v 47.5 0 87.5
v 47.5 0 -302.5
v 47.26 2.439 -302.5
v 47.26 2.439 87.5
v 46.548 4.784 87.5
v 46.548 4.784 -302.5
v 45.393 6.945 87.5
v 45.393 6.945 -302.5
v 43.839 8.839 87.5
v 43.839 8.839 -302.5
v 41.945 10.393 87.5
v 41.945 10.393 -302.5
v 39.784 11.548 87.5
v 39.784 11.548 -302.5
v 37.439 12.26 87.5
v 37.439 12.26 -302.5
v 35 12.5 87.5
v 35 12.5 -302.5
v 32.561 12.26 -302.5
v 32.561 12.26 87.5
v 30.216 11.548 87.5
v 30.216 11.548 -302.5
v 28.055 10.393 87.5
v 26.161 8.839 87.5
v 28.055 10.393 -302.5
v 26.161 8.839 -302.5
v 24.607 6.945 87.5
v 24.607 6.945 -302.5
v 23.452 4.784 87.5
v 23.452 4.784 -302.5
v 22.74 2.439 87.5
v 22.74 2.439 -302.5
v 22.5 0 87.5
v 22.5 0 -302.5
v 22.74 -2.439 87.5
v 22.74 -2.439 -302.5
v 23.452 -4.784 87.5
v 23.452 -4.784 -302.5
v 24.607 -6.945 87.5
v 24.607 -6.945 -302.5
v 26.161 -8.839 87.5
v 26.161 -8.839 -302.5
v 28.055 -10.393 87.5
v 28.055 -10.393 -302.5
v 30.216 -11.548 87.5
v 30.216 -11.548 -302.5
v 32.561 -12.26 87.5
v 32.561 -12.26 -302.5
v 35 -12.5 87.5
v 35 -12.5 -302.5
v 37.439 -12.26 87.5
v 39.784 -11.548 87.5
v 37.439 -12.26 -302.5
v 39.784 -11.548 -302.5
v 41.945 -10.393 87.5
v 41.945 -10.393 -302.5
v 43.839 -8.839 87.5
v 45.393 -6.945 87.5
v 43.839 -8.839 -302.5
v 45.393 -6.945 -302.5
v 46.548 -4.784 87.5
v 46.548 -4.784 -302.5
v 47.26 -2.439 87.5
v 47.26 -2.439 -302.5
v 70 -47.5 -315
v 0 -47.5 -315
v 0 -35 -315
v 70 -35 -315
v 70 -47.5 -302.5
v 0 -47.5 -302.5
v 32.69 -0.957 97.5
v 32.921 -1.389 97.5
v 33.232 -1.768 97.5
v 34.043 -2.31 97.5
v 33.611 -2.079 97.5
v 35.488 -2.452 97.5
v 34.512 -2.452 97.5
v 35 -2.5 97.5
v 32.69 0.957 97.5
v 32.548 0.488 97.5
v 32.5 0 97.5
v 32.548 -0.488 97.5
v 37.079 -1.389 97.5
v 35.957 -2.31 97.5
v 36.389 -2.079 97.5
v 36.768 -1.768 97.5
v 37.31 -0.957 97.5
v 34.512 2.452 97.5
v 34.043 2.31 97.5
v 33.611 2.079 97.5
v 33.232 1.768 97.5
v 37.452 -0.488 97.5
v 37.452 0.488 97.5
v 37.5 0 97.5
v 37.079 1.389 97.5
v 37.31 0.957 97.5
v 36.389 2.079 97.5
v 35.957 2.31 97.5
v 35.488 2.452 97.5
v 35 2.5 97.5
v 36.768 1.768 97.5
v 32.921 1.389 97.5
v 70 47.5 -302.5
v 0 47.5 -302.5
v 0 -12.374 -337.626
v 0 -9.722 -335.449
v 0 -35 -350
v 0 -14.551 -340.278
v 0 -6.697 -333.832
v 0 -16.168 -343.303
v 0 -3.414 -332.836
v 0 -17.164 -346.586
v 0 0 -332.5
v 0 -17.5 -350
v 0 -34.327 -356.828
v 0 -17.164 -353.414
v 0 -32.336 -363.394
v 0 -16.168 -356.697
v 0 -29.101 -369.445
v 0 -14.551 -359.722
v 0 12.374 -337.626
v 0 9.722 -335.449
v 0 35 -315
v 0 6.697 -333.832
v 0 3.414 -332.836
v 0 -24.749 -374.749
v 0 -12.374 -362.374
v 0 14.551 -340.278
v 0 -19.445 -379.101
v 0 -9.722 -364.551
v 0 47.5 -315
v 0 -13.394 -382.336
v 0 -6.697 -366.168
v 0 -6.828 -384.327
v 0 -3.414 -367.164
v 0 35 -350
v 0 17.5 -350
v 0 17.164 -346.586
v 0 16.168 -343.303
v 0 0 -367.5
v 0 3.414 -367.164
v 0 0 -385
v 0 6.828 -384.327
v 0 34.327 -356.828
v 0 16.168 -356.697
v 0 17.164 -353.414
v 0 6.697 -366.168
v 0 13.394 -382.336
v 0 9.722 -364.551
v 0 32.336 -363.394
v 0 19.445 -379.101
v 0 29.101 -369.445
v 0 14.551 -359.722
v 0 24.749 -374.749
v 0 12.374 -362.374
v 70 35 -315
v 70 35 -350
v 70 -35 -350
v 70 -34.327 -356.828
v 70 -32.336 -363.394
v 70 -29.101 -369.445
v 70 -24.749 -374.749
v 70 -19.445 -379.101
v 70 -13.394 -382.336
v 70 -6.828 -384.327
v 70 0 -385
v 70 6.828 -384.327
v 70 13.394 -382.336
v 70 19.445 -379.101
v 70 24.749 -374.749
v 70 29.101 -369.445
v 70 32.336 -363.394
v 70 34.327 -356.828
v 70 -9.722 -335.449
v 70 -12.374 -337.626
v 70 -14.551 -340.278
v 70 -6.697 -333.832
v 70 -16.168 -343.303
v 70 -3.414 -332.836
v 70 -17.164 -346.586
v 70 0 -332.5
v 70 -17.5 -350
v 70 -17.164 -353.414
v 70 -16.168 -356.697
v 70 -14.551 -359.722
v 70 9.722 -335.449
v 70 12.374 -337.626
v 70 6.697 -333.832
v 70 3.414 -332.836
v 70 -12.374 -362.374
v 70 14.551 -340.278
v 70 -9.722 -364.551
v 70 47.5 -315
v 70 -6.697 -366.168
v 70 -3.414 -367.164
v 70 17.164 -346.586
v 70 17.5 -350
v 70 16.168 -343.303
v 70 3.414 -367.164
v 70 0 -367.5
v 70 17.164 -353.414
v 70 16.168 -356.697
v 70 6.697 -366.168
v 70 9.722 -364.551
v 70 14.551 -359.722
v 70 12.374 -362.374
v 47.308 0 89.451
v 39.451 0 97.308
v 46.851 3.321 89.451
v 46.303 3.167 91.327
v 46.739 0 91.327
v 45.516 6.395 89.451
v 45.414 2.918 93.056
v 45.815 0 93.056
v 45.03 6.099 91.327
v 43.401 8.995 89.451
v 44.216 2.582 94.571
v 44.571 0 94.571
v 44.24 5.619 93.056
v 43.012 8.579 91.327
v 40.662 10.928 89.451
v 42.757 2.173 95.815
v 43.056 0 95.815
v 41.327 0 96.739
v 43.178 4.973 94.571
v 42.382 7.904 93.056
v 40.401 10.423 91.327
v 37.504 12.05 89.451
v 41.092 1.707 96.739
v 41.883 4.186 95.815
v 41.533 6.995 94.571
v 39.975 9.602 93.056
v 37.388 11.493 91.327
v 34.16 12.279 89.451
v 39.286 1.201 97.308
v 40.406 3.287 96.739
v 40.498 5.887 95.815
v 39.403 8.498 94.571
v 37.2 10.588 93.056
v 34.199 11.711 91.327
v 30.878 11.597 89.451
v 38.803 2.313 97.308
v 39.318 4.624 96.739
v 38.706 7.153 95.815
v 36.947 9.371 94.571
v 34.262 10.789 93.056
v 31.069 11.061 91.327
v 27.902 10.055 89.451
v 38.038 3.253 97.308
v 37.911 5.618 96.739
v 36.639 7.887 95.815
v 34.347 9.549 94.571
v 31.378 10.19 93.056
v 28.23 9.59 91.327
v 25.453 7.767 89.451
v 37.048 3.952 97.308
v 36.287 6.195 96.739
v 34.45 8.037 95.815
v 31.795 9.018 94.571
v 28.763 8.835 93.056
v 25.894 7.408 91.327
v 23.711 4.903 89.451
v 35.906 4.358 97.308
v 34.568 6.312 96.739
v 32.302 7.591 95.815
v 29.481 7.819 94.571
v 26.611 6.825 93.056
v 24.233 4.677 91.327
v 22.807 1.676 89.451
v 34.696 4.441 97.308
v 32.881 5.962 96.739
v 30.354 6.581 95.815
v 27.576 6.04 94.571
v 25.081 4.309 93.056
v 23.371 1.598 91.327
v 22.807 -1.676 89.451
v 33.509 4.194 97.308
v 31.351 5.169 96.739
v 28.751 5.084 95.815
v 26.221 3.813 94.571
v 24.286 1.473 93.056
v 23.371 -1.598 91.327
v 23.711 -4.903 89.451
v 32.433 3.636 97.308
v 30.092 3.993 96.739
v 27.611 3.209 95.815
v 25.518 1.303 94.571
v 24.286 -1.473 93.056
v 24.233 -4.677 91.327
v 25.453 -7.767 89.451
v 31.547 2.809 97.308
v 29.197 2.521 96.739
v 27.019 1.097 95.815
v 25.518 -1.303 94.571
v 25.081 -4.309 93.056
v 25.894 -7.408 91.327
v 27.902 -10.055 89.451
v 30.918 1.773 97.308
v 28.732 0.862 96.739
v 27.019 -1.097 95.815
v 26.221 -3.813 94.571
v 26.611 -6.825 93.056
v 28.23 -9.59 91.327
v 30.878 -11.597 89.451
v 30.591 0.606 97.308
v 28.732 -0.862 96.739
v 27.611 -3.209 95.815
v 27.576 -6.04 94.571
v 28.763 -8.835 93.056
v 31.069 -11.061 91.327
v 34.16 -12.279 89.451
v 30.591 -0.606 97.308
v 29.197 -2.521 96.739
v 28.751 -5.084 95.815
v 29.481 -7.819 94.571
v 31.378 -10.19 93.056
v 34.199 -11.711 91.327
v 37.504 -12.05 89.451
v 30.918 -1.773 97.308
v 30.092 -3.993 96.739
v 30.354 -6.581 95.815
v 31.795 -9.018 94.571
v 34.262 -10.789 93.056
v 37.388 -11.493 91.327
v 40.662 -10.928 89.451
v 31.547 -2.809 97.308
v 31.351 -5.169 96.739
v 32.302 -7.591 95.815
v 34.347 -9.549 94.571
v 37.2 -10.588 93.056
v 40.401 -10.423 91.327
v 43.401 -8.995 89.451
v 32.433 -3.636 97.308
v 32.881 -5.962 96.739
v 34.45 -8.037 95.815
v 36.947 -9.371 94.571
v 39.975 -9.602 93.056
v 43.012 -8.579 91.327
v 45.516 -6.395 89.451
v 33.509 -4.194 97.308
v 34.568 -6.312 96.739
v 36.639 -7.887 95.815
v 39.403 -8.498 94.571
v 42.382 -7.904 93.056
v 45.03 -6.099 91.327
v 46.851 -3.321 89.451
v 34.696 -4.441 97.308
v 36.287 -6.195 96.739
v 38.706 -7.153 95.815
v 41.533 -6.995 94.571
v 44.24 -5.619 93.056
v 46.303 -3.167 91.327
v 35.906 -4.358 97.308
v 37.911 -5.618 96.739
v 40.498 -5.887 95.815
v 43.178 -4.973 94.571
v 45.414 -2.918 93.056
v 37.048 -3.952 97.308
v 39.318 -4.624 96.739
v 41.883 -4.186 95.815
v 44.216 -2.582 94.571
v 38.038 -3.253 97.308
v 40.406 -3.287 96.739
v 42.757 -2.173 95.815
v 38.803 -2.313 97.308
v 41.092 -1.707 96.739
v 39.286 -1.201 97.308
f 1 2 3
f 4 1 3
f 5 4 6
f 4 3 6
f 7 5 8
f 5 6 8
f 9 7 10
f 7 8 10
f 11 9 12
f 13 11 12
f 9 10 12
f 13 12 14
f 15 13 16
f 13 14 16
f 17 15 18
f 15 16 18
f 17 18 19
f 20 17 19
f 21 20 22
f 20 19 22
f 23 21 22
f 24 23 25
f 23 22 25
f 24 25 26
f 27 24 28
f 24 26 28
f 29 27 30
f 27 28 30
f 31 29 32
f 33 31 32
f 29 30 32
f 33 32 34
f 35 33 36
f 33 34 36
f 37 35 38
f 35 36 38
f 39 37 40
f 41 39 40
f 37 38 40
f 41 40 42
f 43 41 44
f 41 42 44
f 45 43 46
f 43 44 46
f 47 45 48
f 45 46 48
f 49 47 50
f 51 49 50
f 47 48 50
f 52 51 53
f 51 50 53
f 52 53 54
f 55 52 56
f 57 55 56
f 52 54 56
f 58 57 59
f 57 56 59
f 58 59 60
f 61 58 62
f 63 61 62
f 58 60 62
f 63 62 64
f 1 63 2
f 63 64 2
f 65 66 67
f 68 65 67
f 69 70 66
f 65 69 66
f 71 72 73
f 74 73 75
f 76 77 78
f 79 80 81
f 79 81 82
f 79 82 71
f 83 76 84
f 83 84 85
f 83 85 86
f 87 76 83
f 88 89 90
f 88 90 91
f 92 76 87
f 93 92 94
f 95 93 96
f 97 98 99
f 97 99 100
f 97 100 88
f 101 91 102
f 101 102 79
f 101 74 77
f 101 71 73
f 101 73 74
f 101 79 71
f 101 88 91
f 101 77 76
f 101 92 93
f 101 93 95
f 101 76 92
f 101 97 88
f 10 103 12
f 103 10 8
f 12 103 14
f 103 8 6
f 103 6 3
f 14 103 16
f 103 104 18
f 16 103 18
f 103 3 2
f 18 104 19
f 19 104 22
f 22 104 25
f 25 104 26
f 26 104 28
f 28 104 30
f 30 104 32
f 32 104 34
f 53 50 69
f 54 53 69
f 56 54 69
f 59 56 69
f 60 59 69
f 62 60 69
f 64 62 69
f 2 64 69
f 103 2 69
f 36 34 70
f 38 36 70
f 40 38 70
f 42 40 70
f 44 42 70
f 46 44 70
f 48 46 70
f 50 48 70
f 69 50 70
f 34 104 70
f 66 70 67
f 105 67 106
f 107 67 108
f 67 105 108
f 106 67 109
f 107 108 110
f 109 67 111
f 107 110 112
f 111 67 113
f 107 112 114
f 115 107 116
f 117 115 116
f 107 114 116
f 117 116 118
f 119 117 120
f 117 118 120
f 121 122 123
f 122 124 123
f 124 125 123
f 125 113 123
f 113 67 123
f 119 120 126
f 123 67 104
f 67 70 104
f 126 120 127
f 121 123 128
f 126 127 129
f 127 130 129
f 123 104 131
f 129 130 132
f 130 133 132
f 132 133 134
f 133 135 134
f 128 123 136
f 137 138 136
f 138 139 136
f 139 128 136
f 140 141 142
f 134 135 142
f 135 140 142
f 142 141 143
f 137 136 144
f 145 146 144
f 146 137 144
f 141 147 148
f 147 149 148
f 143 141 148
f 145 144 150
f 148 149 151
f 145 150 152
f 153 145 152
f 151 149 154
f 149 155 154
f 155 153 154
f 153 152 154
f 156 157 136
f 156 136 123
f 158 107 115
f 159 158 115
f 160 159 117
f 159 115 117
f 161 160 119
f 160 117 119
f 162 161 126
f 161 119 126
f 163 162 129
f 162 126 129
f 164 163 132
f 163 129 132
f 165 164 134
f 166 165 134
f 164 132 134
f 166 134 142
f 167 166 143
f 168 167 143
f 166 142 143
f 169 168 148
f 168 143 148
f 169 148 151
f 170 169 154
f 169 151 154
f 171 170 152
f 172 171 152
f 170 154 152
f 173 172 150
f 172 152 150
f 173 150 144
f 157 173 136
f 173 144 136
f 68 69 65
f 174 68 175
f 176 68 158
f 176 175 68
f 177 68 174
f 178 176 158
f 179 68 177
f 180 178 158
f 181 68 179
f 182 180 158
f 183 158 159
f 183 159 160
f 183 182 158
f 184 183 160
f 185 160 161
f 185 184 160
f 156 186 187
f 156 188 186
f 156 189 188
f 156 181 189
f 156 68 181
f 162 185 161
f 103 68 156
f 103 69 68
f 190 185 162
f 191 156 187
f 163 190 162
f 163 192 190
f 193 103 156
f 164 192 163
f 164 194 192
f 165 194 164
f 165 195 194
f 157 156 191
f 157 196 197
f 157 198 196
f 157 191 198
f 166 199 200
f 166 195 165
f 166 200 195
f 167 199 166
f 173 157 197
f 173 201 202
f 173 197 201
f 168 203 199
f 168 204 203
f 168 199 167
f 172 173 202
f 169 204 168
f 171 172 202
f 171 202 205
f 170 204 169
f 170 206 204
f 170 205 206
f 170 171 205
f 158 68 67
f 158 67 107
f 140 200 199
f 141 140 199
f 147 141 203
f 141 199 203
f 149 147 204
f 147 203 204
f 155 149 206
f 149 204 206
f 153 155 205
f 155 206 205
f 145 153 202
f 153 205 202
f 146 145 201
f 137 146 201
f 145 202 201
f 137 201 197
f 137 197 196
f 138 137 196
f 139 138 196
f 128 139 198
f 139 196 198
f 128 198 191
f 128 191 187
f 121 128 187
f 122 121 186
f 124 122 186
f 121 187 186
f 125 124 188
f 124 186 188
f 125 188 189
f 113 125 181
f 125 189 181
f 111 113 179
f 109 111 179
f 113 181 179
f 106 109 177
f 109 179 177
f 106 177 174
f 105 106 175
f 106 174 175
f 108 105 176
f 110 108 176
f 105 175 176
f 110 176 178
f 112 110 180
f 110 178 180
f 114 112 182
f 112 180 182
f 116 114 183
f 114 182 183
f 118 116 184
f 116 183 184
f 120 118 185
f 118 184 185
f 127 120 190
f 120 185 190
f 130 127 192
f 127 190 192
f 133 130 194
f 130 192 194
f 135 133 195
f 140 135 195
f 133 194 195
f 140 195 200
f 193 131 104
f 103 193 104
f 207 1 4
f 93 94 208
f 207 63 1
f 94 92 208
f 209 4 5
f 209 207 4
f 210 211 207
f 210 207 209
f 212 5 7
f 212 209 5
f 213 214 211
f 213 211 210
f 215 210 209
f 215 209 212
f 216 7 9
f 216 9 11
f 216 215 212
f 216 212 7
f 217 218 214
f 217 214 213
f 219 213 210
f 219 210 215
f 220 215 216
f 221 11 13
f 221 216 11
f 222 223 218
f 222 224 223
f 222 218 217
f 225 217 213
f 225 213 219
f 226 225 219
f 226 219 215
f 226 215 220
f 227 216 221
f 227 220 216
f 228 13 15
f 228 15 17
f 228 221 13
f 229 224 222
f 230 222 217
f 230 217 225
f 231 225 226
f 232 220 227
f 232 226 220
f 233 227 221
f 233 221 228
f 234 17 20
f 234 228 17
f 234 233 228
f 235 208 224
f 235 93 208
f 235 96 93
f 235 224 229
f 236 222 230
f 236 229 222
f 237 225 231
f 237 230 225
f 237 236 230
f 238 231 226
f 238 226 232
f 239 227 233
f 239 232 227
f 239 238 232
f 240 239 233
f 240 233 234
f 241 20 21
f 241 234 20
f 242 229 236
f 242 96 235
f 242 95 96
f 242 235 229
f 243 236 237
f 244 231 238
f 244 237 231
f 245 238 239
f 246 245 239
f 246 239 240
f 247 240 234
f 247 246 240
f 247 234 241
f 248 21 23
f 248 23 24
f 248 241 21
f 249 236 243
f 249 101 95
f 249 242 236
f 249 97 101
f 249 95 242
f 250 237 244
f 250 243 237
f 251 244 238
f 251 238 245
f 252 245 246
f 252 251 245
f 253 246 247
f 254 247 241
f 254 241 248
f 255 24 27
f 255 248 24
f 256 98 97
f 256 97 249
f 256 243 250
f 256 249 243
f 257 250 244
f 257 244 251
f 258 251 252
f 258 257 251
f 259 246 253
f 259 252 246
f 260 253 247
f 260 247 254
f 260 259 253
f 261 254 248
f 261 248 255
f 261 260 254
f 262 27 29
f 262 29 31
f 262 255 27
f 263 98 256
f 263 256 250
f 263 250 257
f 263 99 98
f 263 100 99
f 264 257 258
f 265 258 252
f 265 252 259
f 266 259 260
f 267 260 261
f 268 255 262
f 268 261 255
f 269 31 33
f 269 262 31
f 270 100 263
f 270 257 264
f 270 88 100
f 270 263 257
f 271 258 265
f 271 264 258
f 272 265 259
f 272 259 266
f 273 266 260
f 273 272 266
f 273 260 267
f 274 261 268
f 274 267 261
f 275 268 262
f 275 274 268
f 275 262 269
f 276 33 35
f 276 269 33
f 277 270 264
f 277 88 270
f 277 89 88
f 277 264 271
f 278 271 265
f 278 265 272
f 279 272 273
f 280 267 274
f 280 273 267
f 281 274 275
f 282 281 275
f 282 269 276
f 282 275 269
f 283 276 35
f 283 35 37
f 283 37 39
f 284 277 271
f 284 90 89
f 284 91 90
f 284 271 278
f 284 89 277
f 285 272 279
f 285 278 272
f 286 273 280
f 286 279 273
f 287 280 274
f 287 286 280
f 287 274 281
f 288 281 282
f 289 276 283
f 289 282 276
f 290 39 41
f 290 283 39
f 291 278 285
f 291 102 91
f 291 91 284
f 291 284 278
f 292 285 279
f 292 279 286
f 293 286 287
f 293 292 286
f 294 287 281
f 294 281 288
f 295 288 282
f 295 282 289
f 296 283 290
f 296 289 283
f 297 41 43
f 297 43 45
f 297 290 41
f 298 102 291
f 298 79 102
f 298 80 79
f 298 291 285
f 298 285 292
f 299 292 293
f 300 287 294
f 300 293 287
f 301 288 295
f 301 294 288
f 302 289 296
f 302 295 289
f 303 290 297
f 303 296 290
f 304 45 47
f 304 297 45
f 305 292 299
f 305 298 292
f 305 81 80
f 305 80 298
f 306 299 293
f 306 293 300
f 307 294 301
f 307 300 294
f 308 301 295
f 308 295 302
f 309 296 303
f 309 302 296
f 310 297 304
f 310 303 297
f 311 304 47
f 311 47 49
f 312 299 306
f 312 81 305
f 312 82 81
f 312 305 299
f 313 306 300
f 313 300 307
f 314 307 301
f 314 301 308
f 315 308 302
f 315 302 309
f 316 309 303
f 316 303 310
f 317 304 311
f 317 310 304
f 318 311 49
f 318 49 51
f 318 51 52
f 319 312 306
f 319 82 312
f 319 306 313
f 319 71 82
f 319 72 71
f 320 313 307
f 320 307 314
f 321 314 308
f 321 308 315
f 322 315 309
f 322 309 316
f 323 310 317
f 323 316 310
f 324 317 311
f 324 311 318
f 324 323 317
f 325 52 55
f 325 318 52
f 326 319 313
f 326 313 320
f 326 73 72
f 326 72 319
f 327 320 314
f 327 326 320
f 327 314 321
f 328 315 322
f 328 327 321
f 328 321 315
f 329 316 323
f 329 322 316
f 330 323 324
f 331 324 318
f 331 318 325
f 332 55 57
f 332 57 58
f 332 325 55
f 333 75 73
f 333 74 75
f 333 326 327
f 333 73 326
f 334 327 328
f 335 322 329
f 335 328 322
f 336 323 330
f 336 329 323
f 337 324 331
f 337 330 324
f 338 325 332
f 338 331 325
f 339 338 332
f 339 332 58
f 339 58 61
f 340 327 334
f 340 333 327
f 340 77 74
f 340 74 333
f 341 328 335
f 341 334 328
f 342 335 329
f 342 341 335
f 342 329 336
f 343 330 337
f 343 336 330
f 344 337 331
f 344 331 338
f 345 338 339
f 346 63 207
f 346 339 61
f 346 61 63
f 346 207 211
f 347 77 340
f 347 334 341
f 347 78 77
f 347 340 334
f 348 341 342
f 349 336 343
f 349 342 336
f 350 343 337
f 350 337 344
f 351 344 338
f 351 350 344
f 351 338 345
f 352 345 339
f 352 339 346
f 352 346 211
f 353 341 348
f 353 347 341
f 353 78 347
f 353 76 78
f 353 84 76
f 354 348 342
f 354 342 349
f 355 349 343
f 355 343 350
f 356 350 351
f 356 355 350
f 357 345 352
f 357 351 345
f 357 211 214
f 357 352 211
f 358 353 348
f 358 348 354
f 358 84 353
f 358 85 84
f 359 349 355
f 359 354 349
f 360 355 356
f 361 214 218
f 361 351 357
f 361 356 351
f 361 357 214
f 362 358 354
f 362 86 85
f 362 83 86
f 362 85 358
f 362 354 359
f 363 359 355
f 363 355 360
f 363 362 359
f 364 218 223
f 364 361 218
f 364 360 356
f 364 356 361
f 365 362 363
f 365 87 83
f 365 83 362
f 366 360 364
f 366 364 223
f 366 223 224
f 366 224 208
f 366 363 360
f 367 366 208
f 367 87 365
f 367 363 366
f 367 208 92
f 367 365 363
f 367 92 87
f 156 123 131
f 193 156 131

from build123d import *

# Parameters (mm, degrees)
BOSS_EXTRUDE2_DEPTH = 70
SKETCH2_R           = 17.5
CUT_EXTRUDE1_DEPTH  = 70
SKETCH5_R           = 12.5
BOSS_EXTRUDE3_DEPTH = 400
FILLET3_R           = 10


with BuildPart() as part:
    # Sketch1 → Boss-Extrude2 (new body)
    with BuildSketch(Plane(origin=(0, 0, 0), x_dir=(0, 0, -1), z_dir=(1, 0, 0))):
        with BuildLine():
            Line((315, 35), (315, 47.5))
            Line((315, 47.5), (302.5, 47.5))
            Line((302.5, 47.5), (302.5, -47.5))
            Line((302.5, -47.5), (315, -47.5))
            Line((315, -47.5), (315, -35))
            Line((315, -35), (350, -35))
            ThreePointArc((350, -35), (385, 0), (350, 35))
            Line((350, 35), (315, 35))
        make_face()
    extrude(amount=BOSS_EXTRUDE2_DEPTH)

    # Sketch2 → Cut-Extrude1 (cut)
    with BuildSketch(Plane(origin=(70, 0, 0), x_dir=(0, 0, -1), z_dir=(1, 0, 0))):
        with Locations((350, 0)):
            Circle(SKETCH2_R)
    extrude(amount=-CUT_EXTRUDE1_DEPTH, mode=Mode.SUBTRACT)

    # Sketch5 → Boss-Extrude3 (add)
    with BuildSketch(Plane.XY.offset(-302.5)):
        with Locations((35, 0)):
            Circle(SKETCH5_R)
    extrude(amount=BOSS_EXTRUDE3_DEPTH)

    # Fillet3
    fillet3_edges = [part.edges().sort_by_distance(p)[0] for p in [
        (22.5, 0, 97.5),
    ]]
    fillet(fillet3_edges, radius=FILLET3_R)


solid = part.part
